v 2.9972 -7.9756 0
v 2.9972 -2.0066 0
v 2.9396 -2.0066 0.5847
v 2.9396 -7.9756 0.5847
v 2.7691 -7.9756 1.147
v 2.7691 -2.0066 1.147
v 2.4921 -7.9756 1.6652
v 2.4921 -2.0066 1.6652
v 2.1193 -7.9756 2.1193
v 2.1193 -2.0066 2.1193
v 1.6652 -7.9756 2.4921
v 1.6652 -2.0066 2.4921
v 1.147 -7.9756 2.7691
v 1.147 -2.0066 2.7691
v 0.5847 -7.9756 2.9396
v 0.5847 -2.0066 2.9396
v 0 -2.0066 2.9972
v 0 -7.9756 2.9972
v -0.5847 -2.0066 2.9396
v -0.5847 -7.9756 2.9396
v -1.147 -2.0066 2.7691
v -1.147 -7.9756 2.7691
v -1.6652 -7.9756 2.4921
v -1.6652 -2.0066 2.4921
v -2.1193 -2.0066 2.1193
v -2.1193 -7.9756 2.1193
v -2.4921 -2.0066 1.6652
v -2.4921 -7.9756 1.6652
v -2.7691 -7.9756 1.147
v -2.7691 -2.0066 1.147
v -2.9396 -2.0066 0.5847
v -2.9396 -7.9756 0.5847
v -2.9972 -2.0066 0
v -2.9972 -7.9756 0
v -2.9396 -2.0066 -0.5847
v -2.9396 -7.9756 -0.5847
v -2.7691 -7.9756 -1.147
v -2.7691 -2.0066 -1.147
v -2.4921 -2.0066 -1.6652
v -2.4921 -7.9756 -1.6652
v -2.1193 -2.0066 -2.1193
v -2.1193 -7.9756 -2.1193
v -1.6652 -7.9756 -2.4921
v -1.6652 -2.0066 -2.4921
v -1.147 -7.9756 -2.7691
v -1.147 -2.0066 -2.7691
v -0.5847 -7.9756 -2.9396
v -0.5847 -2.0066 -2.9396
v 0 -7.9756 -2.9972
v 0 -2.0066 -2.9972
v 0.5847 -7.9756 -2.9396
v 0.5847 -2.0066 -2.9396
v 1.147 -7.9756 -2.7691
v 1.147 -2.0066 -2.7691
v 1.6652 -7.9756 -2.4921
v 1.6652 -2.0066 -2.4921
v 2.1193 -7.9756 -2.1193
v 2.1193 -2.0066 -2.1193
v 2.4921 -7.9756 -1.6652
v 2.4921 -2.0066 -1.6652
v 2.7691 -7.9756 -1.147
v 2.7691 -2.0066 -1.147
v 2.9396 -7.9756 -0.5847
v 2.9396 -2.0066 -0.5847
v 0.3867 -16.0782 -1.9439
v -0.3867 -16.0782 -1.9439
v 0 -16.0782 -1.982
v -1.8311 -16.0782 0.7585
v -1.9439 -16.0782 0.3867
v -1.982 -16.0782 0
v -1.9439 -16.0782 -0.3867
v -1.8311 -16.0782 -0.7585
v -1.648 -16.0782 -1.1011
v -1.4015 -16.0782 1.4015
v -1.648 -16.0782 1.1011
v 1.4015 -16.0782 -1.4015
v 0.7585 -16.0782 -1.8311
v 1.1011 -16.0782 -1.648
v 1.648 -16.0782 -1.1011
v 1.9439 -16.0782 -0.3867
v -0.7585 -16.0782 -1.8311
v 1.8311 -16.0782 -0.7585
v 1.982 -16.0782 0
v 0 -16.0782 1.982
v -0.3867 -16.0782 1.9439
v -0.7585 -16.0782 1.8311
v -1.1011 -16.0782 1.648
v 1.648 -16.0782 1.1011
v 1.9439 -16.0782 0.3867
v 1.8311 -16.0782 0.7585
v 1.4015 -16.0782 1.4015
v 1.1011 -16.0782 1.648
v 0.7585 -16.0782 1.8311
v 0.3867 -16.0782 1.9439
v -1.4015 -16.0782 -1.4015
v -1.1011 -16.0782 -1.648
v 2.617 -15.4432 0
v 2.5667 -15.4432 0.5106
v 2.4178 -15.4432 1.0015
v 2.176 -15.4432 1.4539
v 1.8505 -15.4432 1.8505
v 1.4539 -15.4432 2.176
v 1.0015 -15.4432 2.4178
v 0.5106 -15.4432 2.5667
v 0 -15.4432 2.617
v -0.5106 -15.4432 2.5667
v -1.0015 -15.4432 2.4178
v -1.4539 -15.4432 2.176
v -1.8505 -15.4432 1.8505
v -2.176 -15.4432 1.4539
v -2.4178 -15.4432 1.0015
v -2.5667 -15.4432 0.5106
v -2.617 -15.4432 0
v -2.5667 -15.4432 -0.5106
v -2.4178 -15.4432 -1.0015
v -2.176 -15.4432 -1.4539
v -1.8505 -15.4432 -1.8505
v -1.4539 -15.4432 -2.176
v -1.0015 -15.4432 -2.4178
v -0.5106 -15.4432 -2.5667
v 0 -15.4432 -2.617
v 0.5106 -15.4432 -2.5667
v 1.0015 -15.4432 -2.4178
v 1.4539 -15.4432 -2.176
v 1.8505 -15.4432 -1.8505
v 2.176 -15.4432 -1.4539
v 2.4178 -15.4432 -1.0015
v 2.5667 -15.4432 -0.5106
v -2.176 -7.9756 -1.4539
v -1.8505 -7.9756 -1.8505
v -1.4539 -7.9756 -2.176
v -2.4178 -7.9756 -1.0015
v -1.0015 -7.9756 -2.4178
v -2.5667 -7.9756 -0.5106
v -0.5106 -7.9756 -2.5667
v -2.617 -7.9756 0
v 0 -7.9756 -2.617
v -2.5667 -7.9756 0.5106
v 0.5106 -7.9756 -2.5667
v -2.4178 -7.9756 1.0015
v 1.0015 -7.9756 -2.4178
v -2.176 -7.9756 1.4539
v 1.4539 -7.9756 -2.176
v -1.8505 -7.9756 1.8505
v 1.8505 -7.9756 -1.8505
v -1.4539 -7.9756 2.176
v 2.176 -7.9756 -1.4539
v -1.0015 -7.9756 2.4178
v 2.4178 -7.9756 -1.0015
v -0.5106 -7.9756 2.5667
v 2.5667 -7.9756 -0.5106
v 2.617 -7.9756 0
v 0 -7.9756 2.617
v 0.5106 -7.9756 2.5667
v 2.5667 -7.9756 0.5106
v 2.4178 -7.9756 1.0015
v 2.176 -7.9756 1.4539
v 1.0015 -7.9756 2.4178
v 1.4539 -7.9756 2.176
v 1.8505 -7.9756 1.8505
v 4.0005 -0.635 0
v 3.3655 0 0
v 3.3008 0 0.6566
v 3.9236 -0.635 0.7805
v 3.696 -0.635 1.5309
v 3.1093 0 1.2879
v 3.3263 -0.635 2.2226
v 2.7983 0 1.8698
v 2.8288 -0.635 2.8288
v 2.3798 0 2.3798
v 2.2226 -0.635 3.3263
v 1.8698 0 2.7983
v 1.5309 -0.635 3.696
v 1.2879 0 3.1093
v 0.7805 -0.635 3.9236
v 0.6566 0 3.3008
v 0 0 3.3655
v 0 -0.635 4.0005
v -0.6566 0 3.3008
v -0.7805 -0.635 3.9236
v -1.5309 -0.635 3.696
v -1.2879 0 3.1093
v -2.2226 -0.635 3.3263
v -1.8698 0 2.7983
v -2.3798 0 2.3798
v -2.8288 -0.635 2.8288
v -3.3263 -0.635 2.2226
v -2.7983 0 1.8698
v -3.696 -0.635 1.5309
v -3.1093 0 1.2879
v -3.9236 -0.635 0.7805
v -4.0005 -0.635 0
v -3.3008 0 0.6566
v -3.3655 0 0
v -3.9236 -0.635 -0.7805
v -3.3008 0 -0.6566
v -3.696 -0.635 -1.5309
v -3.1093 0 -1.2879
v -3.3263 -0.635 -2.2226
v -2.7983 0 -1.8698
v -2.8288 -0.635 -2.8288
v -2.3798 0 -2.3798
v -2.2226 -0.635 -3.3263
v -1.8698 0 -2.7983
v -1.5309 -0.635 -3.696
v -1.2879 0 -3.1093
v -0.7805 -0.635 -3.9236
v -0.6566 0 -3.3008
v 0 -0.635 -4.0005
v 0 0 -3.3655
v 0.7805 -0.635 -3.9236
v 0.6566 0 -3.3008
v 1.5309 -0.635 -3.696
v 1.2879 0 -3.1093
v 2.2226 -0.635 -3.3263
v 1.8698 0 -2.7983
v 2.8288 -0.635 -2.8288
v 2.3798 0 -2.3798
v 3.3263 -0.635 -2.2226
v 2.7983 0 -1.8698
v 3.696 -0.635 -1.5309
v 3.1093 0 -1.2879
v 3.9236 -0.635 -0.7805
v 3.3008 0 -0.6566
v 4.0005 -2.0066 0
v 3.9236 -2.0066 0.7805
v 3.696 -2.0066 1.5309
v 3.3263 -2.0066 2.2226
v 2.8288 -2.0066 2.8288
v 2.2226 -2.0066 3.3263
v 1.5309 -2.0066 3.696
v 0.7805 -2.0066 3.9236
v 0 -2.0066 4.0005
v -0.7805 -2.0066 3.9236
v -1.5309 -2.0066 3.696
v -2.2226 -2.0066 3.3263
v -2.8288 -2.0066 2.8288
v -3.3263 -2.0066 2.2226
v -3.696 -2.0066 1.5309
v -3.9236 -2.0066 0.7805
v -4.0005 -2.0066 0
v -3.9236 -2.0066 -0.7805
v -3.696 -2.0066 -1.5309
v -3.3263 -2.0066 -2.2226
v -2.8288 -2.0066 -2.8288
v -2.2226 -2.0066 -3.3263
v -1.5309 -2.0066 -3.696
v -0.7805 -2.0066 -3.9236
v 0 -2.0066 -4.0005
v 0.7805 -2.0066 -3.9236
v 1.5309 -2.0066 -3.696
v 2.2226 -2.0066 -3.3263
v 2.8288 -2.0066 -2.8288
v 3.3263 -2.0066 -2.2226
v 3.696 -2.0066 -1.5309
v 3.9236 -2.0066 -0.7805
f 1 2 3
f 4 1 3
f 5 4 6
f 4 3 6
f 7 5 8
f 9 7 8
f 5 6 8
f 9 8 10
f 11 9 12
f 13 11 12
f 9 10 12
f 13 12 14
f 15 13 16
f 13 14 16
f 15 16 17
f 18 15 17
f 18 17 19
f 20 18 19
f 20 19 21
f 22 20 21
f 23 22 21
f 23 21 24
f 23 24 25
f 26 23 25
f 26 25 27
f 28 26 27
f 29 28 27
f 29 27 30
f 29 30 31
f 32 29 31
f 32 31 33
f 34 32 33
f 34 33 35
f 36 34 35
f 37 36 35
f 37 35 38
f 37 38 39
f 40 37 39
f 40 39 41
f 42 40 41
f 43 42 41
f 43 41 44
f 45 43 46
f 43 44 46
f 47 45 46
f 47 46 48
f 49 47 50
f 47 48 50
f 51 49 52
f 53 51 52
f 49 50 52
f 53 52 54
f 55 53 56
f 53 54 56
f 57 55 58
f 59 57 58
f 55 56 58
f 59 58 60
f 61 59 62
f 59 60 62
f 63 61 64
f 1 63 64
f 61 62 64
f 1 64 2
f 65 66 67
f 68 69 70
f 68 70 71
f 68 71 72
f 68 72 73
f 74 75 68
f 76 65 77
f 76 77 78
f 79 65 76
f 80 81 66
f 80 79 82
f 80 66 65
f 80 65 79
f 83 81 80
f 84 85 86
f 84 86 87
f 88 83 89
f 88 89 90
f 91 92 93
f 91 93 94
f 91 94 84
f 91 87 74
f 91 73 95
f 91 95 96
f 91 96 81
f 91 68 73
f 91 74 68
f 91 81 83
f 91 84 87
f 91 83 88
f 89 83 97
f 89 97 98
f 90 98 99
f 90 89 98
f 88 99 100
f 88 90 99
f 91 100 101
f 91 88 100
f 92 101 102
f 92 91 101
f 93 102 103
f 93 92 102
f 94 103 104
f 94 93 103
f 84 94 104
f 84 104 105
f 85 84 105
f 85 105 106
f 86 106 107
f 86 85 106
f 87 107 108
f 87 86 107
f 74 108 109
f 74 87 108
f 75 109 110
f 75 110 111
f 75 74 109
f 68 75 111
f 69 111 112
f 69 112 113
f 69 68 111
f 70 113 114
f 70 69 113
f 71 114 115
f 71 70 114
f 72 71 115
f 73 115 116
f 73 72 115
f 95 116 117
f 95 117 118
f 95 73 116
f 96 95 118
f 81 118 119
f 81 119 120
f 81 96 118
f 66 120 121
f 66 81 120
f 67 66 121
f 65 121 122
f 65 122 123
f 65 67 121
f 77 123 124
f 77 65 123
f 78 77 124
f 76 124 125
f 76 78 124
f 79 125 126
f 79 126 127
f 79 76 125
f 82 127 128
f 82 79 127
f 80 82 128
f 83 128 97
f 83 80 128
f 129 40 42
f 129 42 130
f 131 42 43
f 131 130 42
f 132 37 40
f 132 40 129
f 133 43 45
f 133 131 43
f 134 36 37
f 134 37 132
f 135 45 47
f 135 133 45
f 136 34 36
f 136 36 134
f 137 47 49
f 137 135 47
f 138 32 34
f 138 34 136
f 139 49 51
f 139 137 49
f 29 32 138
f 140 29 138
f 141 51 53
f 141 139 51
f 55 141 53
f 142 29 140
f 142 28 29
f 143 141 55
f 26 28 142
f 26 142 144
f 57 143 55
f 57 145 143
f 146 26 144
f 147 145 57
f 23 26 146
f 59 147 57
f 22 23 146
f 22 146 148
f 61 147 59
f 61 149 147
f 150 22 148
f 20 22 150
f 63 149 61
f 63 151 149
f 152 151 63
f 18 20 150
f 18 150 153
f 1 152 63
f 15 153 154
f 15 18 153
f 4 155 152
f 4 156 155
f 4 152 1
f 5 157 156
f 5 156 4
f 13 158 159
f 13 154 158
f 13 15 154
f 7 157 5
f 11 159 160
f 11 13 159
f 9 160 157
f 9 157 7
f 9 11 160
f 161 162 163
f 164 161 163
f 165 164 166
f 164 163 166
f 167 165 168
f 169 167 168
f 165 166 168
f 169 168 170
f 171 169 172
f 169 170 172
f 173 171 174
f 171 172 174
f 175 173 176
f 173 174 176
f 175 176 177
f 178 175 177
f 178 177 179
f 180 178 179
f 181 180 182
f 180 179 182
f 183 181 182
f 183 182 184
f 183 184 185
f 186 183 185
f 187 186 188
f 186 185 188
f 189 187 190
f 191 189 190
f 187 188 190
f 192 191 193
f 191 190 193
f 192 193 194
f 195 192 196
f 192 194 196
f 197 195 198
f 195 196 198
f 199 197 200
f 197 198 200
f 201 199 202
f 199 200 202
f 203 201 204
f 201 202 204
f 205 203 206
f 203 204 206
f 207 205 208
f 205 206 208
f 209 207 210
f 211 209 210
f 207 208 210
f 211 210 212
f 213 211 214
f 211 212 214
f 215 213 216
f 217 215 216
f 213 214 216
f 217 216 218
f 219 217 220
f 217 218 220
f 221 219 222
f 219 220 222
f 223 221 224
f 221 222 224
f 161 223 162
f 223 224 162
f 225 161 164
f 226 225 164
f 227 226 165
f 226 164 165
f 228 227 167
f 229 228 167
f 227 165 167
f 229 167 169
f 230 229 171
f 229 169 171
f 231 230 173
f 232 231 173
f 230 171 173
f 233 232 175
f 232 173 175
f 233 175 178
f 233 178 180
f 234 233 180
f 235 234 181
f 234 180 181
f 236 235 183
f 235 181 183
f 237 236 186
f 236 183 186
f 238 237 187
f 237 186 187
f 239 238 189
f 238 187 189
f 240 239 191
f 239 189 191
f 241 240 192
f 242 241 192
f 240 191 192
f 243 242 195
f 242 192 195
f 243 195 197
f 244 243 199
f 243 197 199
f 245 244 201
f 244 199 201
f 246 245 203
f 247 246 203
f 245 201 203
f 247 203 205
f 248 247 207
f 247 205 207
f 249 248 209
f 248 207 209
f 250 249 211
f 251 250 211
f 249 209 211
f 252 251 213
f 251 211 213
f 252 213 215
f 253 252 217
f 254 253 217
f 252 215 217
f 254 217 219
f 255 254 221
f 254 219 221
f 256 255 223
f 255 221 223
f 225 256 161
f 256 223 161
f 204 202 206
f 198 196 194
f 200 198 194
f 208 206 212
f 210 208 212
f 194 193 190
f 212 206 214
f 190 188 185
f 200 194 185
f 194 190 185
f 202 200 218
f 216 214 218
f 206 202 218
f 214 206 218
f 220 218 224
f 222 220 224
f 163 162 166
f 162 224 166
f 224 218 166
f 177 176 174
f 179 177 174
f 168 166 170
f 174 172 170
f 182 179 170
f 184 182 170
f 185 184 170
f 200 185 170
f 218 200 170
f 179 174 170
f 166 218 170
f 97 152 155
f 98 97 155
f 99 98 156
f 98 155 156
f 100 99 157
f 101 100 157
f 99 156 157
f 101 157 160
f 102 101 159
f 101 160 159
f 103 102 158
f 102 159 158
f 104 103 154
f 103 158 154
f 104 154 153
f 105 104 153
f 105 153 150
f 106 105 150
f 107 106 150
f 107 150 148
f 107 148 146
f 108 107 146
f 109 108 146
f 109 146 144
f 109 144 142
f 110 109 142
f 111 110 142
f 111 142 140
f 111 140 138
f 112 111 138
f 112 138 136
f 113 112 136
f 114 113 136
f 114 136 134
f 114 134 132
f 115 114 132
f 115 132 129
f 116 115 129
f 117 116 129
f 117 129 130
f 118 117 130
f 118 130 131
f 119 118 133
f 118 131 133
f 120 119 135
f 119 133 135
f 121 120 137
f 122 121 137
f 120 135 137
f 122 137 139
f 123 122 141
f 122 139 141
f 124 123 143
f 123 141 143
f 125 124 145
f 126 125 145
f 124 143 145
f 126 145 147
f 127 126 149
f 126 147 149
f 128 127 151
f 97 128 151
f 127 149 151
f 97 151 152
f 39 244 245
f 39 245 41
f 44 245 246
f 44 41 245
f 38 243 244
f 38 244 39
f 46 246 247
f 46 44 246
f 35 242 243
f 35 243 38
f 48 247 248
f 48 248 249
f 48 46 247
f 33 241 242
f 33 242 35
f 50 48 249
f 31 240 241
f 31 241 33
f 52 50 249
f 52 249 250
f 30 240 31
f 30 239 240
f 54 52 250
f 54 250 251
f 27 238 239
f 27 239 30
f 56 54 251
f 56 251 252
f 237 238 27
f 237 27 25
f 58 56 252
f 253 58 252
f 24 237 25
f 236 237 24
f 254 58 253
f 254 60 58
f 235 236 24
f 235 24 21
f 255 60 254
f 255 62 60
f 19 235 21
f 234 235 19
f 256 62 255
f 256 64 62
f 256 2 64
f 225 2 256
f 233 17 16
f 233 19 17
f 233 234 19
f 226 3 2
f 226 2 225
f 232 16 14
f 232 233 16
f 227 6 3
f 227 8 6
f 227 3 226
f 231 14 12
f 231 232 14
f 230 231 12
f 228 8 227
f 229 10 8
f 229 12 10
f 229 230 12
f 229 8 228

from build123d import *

# Parameters (mm, degrees)
F0_R     = 2.9972
F0_R_2   = 2.61701
F1_DEPTH = 7.9756
F0_R_3   = 4.0005
F2_DEPTH = 2.0066
F3_DEPTH = 16.0782
F4_SIZE  = 0.635


with BuildPart() as f1:
    # F0 (on Front) → F1 (new body)
    with BuildSketch(Plane.XZ):
        Circle(F0_R)
        Circle(F0_R_2, mode=Mode.SUBTRACT)
    extrude(amount=F1_DEPTH)

    # F0 (on Front) → F2 (join)
    with BuildSketch(Plane.XZ):
        Circle(F0_R_3)
        Circle(F0_R, mode=Mode.SUBTRACT)
    extrude(amount=F2_DEPTH)

    # F0 (on Front) → F3 (join)
    with BuildSketch(Plane.XZ):
        Circle(F0_R_2)
    extrude(amount=F3_DEPTH)

    # F4
    f4_edges = [f1.edges().sort_by_distance(p)[0] for p in [
        (-4.0005, 0, 0),
        (-2.61701, -16.0782, 0),
    ]]
    chamfer(f4_edges, length=F4_SIZE)


solid = f1.part
